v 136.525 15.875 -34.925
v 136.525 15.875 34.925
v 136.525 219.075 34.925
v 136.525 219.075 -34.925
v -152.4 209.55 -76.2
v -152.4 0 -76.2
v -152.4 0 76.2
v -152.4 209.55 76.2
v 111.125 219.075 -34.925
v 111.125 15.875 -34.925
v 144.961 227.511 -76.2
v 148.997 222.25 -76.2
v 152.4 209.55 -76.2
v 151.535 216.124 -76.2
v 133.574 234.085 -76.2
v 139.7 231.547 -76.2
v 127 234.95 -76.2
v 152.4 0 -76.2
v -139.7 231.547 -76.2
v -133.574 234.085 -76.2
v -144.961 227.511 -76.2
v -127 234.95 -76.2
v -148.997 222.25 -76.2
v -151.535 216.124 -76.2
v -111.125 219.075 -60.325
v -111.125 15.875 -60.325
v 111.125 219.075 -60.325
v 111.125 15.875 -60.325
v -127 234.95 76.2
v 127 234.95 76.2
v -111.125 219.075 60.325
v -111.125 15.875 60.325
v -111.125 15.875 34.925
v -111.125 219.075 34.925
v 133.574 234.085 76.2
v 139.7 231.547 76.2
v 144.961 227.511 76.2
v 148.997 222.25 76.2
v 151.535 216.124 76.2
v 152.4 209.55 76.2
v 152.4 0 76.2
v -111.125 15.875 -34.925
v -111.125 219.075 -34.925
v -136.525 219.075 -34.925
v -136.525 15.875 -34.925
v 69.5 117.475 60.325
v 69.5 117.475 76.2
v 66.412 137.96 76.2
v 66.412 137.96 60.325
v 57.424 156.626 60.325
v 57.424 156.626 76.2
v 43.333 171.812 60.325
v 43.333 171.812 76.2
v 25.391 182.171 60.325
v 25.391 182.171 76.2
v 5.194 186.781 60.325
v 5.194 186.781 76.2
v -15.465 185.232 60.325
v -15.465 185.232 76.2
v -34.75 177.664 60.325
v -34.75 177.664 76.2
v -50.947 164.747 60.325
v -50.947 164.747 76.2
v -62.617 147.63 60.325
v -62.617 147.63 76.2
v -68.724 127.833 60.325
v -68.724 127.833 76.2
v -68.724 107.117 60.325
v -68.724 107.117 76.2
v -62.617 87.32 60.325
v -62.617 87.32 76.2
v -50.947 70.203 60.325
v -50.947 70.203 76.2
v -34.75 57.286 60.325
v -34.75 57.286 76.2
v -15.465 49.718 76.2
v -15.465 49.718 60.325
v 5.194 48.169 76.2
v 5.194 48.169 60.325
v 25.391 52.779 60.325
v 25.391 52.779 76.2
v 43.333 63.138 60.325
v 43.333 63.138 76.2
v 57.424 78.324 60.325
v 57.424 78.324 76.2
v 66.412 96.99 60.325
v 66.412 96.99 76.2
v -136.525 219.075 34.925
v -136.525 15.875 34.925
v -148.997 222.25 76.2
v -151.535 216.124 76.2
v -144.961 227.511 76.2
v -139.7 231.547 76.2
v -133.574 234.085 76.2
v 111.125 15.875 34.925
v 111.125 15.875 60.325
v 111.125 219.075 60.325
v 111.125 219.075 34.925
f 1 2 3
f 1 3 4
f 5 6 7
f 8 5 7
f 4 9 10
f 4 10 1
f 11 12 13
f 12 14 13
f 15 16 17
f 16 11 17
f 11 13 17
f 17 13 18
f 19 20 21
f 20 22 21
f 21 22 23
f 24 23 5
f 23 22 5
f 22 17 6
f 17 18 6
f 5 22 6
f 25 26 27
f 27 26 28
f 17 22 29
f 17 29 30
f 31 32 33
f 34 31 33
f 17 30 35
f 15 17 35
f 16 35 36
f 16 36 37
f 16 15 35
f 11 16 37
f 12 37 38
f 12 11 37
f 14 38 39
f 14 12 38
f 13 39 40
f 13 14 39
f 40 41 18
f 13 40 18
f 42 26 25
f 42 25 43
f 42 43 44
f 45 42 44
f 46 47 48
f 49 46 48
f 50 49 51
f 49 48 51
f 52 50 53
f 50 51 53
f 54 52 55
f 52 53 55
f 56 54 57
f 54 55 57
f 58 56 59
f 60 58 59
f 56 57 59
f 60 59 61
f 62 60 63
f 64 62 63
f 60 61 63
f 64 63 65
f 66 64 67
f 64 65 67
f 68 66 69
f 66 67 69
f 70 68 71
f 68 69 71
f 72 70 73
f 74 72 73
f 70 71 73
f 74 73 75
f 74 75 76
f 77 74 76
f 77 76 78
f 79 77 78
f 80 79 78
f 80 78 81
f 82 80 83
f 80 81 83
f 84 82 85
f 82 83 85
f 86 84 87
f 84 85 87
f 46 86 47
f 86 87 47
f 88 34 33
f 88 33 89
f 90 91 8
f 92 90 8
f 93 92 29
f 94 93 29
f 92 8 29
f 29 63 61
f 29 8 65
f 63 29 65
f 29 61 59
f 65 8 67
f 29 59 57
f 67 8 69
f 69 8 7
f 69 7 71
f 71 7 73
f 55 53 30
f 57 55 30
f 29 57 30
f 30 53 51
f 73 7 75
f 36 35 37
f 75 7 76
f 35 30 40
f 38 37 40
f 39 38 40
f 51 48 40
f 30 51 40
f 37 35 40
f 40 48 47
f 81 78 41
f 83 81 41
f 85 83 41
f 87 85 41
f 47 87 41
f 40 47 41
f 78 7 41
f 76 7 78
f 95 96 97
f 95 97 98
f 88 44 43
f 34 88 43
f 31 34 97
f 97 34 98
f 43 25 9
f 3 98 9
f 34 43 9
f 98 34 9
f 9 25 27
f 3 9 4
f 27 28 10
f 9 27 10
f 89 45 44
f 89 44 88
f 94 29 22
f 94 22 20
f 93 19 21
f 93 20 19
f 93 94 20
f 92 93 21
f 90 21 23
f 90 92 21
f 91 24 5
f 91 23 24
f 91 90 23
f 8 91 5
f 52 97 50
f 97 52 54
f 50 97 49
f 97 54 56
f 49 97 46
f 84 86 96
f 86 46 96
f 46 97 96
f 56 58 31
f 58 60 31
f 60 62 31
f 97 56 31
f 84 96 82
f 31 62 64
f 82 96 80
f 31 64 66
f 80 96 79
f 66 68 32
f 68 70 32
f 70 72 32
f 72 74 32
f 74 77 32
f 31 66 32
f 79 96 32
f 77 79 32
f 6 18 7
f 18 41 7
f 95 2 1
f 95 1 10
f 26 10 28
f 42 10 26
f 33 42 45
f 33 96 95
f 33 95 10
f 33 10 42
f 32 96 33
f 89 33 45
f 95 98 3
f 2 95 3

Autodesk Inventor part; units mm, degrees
ref_plane "YZ Plane" through (0, 0, 0) normal (1, 0, 0) x (0, 1, 0)
ref_plane "XZ Plane" through (0, 0, 0) normal (0, 1, 0) x (-1, 0, 0)
ref_plane "XY Plane" through (0, 0, 0) normal (0, 0, 1) x (1, 0, 0)
sketch "Sketch1" plane through (0, 0, 0) normal (0, 1, 0) x (-1, 0, 0)
  line L0 (152.4, 76.2) -> (-152.4, 76.2)
  line L1 (-152.4, 76.2) -> (-152.4, -76.2)
  line L2 (-152.4, -76.2) -> (152.4, -76.2)
  line L3 (152.4, -76.2) -> (152.4, 76.2)
  point P0 (0, 0)
  point P1 (152.4, 0)
  point P2 (0, -76.2)
  dimension "d0" = 152.4
  dimension "d1" = 304.8
extrude "Extrusion1" add sketch "Sketch1" along normal blind 15.875
sketch "Sketch4" plane through (0, 15.875, 0) normal (0, 1, 0) x (1, 0, 0)
  line L0 (-152.4, -76.2) -> (152.4, -76.2) projected
  line L1 (152.4, -76.2) -> (152.4, 76.2) projected
  line L2 (152.4, 76.2) -> (-152.4, 76.2) projected
  line L3 (-152.4, 76.2) -> (-152.4, -76.2) projected
  line L4 (-152.4, -76.2) -> (152.4, -76.2) projected
  line L5 (-152.4, -76.2) -> (136.525, -76.2)
  line L6 (136.525, -76.2) -> (136.525, -60.325)
  line L7 (136.525, -60.325) -> (-152.4, -60.325)
  line L8 (-152.4, -60.325) -> (-152.4, -76.2)
  point P0 (0, 0)
  dimension "d4" = 15.875
  dimension "d5" = 15.875
extrude "Extrusion2" add sketch "Sketch4" along normal blind 203.2 contours L3 L7 L6 L0
sketch "Sketch5" plane through (0, 15.875, 0) normal (0, 1, 0) x (1, 0, 0)
  line L0 (136.525, -60.325) -> (136.525, -76.2) projected
  line L1 (136.525, -76.2) -> (152.4, -76.2) projected
  line L2 (152.4, -76.2) -> (152.4, 76.2) projected
  line L3 (152.4, 76.2) -> (-152.4, 76.2) projected
  line L4 (-152.4, 76.2) -> (-152.4, -60.325) projected
  line L5 (-152.4, -60.325) -> (136.525, -60.325) projected
  line L6 (-152.4, -76.2) -> (152.4, -76.2) projected
  line L7 (152.4, -76.2) -> (136.525, -76.2)
  line L8 (136.525, -76.2) -> (136.525, 60.325)
  line L9 (136.525, 60.325) -> (152.4, 60.325)
  line L10 (152.4, 60.325) -> (152.4, -76.2)
  line L11 (136.525, -76.2) -> (136.525, -60.325) projected
  point P0 (0, 0)
  dimension "d8" = 15.875
extrude "Extrusion3" add sketch "Sketch5" along normal blind 203.2 contours L8 L9 L2 L1 L0
sketch "Sketch6" plane through (0, 15.875, 0) normal (0, 1, 0) x (1, 0, 0)
  line L0 (136.525, 60.325) -> (152.4, 60.325) projected
  line L1 (152.4, 60.325) -> (152.4, 76.2) projected
  line L2 (152.4, 76.2) -> (-152.4, 76.2) projected
  line L3 (-152.4, 76.2) -> (-152.4, -60.325) projected
  line L4 (-152.4, -60.325) -> (136.525, -60.325) projected
  line L5 (136.525, -60.325) -> (136.525, 60.325) projected
  line L6 (152.4, 76.2) -> (-136.525, 76.2)
  line L7 (-136.525, 76.2) -> (-136.525, 60.325)
  line L8 (-136.525, 60.325) -> (152.4, 60.325)
  line L9 (152.4, 60.325) -> (152.4, 76.2)
  line L10 (152.4, 60.325) -> (136.525, 60.325) projected
  point P0 (0, 0)
  dimension "d11" = 15.875
extrude "Extrusion4" add sketch "Sketch6" along normal blind 203.2 contours L8 L7 L2 L1 L0
sketch "Sketch7" plane through (0, 15.875, 0) normal (0, 1, 0) x (1, 0, 0)
  line L0 (-136.525, 60.325) -> (-136.525, 76.2) projected
  line L1 (-136.525, 76.2) -> (-152.4, 76.2) projected
  line L2 (-152.4, 76.2) -> (-152.4, -60.325) projected
  line L3 (-152.4, -60.325) -> (136.525, -60.325) projected
  line L4 (136.525, -60.325) -> (136.525, 60.325) projected
  line L5 (136.525, 60.325) -> (-136.525, 60.325) projected
  line L6 (-152.4, -60.325) -> (136.525, -60.325) projected
  line L7 (-152.4, 76.2) -> (-136.525, 76.2)
  line L8 (-136.525, 76.2) -> (-136.525, -60.325)
  line L9 (-136.525, -60.325) -> (-152.4, -60.325)
  line L10 (-152.4, -60.325) -> (-152.4, 76.2)
  line L11 (-136.525, 76.2) -> (-136.525, 60.325) projected
  point P0 (0, 0)
extrude "Extrusion5" add sketch "Sketch7" along normal blind 203.2 contours L8 L3 L2 L1 L0
sketch "Sketch8" plane through (0, 219.075, 0) normal (0, 1, 0) x (1, 0, 0)
  line L0 (136.525, -60.325) -> (-136.525, -60.325) projected
  line L1 (-152.4, 76.2) -> (-152.4, -76.2) projected
  line L2 (152.4, -76.2) -> (152.4, 76.2) projected
  line L3 (-152.4, 76.2) -> (152.4, 76.2)
  line L4 (152.4, 76.2) -> (152.4, -76.2)
  line L5 (152.4, -76.2) -> (-152.4, -76.2)
  line L6 (-152.4, -76.2) -> (-152.4, 76.2)
  line L7 (-152.4, -76.2) -> (152.4, -76.2) projected
  line L8 (136.525, 60.325) -> (136.525, -60.325) projected
  line L9 (152.4, -76.2) -> (152.4, 76.2) projected
  line L10 (-136.525, 60.325) -> (136.525, 60.325) projected
  line L11 (-136.525, -60.325) -> (-136.525, 60.325) projected
  line L12 (152.4, 76.2) -> (-152.4, 76.2) projected
  point P0 (0, 0)
extrude "Extrusion6" add sketch "Sketch8" along normal blind 15.875 contours L0 L11 L10 L8 | L3 L2 L5 L1
sketch "Sketch9" plane through (-152.4, 0, 76.2) normal (0, 0, 1) x (1, 0, 0)
  circle A0 centre (152.4, 117.475) radius 69.5
  line L0 (0, 0) -> (304.8, 0) projected
  line L1 (304.8, 0) -> (304.8, 234.95) projected
  line L2 (0, 0) -> (0, 234.95) projected
  line L3 (0, 234.95) -> (304.8, 234.95) projected
  line L4 (0, 234.95) -> (304.8, 234.95) projected
  point P0 (152.4, 0)
  point P1 (304.8, 117.475)
  point P2 (152.4, 234.95)
  point P3 (234.95, 190.5)
  point P4 (152.4, 234.95)
  dimension "d18" = 139
extrude "Extrusion7" cut sketch "Sketch9" against normal up to next contours A0
sketch "Sketch10" plane through (0, 15.875, 0) normal (0, 1, 0) x (1, 0, 0)
  line L0 (-136.525, 60.325) -> (-136.525, -60.325) projected
  line L1 (-136.525, -60.325) -> (136.525, -60.325) projected
  line L2 (136.525, -60.325) -> (136.525, 60.325) projected
  line L3 (136.525, 60.325) -> (-136.525, 60.325) projected
  line L4 (-136.525, 60.325) -> (-111.125, 60.325)
  line L5 (-111.125, 60.325) -> (-111.125, 34.925)
  line L6 (-111.125, 34.925) -> (-136.525, 34.925)
  line L7 (-136.525, 34.925) -> (-136.525, 60.325)
  line L8 (136.525, 60.325) -> (111.125, 60.325)
  line L9 (111.125, 60.325) -> (111.125, 34.925)
  line L10 (111.125, 34.925) -> (136.525, 34.925)
  line L11 (136.525, 34.925) -> (136.525, 60.325)
  line L12 (-136.525, -60.325) -> (-111.125, -60.325)
  line L13 (-111.125, -60.325) -> (-111.125, -34.925)
  line L14 (-111.125, -34.925) -> (-136.525, -34.925)
  line L15 (-136.525, -34.925) -> (-136.525, -60.325)
  line L16 (136.525, -60.325) -> (111.125, -60.325)
  line L17 (111.125, -60.325) -> (111.125, -34.925)
  line L18 (111.125, -34.925) -> (136.525, -34.925)
  line L19 (136.525, -34.925) -> (136.525, -60.325)
  point P0 (0, 0)
  dimension "d21" = 25.4
  dimension "d22" = 25.4
  dimension "d23" = 25.4
  dimension "d24" = 25.4
  dimension "d25" = 25.4
  dimension "d26" = 25.4
extrude "Extrusion8" add sketch "Sketch10" along normal up to surface (203.2 mm away) contours L3 L5 L6 L0 | L14 L13 L1 L0 | L3 L2 L10 L9 | L17 L18 L2 L1
fillet "Fillet1" radius 25.4 2 edges at (152.4, 234.95, 0) (-152.4, 234.95, 0)
equation "\"d5\" = d4"
properties part number "speakerBox" material "Wood (Birch)"
